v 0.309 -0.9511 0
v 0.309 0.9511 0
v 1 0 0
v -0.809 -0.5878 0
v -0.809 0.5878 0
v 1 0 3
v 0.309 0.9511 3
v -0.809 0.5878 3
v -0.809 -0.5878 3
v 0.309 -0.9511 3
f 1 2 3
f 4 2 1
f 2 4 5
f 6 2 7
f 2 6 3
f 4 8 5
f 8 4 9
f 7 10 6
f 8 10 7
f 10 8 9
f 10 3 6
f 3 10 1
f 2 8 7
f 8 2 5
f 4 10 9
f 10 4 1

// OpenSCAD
// file: dotSCAD-2.1/src/rounded_square.scad
module rounded_square(size,radius) {
    hull() {
        translate([radius, radius])
            circle(radius);
        translate([size.x - radius, radius])
            circle(radius);
        translate([radius, size.y - radius])
            circle(radius);
        translate([size.x - radius, size.y - radius])
            circle(radius);
    }
}
// main file
include <dotSCAD-2.1/src/rounded_square.scad>;

difference(){
linear_extrude(height = 3)
rounded_square(size = [165,30], corner_r = 2);

translate([15,4,0]) 
linear_extrude(height = 10)
   resize([16,20]) 
   import (file = "/Users/dkachaev/Dropbox/raspberrypi_logo.dxf", scale=0.1);
}
